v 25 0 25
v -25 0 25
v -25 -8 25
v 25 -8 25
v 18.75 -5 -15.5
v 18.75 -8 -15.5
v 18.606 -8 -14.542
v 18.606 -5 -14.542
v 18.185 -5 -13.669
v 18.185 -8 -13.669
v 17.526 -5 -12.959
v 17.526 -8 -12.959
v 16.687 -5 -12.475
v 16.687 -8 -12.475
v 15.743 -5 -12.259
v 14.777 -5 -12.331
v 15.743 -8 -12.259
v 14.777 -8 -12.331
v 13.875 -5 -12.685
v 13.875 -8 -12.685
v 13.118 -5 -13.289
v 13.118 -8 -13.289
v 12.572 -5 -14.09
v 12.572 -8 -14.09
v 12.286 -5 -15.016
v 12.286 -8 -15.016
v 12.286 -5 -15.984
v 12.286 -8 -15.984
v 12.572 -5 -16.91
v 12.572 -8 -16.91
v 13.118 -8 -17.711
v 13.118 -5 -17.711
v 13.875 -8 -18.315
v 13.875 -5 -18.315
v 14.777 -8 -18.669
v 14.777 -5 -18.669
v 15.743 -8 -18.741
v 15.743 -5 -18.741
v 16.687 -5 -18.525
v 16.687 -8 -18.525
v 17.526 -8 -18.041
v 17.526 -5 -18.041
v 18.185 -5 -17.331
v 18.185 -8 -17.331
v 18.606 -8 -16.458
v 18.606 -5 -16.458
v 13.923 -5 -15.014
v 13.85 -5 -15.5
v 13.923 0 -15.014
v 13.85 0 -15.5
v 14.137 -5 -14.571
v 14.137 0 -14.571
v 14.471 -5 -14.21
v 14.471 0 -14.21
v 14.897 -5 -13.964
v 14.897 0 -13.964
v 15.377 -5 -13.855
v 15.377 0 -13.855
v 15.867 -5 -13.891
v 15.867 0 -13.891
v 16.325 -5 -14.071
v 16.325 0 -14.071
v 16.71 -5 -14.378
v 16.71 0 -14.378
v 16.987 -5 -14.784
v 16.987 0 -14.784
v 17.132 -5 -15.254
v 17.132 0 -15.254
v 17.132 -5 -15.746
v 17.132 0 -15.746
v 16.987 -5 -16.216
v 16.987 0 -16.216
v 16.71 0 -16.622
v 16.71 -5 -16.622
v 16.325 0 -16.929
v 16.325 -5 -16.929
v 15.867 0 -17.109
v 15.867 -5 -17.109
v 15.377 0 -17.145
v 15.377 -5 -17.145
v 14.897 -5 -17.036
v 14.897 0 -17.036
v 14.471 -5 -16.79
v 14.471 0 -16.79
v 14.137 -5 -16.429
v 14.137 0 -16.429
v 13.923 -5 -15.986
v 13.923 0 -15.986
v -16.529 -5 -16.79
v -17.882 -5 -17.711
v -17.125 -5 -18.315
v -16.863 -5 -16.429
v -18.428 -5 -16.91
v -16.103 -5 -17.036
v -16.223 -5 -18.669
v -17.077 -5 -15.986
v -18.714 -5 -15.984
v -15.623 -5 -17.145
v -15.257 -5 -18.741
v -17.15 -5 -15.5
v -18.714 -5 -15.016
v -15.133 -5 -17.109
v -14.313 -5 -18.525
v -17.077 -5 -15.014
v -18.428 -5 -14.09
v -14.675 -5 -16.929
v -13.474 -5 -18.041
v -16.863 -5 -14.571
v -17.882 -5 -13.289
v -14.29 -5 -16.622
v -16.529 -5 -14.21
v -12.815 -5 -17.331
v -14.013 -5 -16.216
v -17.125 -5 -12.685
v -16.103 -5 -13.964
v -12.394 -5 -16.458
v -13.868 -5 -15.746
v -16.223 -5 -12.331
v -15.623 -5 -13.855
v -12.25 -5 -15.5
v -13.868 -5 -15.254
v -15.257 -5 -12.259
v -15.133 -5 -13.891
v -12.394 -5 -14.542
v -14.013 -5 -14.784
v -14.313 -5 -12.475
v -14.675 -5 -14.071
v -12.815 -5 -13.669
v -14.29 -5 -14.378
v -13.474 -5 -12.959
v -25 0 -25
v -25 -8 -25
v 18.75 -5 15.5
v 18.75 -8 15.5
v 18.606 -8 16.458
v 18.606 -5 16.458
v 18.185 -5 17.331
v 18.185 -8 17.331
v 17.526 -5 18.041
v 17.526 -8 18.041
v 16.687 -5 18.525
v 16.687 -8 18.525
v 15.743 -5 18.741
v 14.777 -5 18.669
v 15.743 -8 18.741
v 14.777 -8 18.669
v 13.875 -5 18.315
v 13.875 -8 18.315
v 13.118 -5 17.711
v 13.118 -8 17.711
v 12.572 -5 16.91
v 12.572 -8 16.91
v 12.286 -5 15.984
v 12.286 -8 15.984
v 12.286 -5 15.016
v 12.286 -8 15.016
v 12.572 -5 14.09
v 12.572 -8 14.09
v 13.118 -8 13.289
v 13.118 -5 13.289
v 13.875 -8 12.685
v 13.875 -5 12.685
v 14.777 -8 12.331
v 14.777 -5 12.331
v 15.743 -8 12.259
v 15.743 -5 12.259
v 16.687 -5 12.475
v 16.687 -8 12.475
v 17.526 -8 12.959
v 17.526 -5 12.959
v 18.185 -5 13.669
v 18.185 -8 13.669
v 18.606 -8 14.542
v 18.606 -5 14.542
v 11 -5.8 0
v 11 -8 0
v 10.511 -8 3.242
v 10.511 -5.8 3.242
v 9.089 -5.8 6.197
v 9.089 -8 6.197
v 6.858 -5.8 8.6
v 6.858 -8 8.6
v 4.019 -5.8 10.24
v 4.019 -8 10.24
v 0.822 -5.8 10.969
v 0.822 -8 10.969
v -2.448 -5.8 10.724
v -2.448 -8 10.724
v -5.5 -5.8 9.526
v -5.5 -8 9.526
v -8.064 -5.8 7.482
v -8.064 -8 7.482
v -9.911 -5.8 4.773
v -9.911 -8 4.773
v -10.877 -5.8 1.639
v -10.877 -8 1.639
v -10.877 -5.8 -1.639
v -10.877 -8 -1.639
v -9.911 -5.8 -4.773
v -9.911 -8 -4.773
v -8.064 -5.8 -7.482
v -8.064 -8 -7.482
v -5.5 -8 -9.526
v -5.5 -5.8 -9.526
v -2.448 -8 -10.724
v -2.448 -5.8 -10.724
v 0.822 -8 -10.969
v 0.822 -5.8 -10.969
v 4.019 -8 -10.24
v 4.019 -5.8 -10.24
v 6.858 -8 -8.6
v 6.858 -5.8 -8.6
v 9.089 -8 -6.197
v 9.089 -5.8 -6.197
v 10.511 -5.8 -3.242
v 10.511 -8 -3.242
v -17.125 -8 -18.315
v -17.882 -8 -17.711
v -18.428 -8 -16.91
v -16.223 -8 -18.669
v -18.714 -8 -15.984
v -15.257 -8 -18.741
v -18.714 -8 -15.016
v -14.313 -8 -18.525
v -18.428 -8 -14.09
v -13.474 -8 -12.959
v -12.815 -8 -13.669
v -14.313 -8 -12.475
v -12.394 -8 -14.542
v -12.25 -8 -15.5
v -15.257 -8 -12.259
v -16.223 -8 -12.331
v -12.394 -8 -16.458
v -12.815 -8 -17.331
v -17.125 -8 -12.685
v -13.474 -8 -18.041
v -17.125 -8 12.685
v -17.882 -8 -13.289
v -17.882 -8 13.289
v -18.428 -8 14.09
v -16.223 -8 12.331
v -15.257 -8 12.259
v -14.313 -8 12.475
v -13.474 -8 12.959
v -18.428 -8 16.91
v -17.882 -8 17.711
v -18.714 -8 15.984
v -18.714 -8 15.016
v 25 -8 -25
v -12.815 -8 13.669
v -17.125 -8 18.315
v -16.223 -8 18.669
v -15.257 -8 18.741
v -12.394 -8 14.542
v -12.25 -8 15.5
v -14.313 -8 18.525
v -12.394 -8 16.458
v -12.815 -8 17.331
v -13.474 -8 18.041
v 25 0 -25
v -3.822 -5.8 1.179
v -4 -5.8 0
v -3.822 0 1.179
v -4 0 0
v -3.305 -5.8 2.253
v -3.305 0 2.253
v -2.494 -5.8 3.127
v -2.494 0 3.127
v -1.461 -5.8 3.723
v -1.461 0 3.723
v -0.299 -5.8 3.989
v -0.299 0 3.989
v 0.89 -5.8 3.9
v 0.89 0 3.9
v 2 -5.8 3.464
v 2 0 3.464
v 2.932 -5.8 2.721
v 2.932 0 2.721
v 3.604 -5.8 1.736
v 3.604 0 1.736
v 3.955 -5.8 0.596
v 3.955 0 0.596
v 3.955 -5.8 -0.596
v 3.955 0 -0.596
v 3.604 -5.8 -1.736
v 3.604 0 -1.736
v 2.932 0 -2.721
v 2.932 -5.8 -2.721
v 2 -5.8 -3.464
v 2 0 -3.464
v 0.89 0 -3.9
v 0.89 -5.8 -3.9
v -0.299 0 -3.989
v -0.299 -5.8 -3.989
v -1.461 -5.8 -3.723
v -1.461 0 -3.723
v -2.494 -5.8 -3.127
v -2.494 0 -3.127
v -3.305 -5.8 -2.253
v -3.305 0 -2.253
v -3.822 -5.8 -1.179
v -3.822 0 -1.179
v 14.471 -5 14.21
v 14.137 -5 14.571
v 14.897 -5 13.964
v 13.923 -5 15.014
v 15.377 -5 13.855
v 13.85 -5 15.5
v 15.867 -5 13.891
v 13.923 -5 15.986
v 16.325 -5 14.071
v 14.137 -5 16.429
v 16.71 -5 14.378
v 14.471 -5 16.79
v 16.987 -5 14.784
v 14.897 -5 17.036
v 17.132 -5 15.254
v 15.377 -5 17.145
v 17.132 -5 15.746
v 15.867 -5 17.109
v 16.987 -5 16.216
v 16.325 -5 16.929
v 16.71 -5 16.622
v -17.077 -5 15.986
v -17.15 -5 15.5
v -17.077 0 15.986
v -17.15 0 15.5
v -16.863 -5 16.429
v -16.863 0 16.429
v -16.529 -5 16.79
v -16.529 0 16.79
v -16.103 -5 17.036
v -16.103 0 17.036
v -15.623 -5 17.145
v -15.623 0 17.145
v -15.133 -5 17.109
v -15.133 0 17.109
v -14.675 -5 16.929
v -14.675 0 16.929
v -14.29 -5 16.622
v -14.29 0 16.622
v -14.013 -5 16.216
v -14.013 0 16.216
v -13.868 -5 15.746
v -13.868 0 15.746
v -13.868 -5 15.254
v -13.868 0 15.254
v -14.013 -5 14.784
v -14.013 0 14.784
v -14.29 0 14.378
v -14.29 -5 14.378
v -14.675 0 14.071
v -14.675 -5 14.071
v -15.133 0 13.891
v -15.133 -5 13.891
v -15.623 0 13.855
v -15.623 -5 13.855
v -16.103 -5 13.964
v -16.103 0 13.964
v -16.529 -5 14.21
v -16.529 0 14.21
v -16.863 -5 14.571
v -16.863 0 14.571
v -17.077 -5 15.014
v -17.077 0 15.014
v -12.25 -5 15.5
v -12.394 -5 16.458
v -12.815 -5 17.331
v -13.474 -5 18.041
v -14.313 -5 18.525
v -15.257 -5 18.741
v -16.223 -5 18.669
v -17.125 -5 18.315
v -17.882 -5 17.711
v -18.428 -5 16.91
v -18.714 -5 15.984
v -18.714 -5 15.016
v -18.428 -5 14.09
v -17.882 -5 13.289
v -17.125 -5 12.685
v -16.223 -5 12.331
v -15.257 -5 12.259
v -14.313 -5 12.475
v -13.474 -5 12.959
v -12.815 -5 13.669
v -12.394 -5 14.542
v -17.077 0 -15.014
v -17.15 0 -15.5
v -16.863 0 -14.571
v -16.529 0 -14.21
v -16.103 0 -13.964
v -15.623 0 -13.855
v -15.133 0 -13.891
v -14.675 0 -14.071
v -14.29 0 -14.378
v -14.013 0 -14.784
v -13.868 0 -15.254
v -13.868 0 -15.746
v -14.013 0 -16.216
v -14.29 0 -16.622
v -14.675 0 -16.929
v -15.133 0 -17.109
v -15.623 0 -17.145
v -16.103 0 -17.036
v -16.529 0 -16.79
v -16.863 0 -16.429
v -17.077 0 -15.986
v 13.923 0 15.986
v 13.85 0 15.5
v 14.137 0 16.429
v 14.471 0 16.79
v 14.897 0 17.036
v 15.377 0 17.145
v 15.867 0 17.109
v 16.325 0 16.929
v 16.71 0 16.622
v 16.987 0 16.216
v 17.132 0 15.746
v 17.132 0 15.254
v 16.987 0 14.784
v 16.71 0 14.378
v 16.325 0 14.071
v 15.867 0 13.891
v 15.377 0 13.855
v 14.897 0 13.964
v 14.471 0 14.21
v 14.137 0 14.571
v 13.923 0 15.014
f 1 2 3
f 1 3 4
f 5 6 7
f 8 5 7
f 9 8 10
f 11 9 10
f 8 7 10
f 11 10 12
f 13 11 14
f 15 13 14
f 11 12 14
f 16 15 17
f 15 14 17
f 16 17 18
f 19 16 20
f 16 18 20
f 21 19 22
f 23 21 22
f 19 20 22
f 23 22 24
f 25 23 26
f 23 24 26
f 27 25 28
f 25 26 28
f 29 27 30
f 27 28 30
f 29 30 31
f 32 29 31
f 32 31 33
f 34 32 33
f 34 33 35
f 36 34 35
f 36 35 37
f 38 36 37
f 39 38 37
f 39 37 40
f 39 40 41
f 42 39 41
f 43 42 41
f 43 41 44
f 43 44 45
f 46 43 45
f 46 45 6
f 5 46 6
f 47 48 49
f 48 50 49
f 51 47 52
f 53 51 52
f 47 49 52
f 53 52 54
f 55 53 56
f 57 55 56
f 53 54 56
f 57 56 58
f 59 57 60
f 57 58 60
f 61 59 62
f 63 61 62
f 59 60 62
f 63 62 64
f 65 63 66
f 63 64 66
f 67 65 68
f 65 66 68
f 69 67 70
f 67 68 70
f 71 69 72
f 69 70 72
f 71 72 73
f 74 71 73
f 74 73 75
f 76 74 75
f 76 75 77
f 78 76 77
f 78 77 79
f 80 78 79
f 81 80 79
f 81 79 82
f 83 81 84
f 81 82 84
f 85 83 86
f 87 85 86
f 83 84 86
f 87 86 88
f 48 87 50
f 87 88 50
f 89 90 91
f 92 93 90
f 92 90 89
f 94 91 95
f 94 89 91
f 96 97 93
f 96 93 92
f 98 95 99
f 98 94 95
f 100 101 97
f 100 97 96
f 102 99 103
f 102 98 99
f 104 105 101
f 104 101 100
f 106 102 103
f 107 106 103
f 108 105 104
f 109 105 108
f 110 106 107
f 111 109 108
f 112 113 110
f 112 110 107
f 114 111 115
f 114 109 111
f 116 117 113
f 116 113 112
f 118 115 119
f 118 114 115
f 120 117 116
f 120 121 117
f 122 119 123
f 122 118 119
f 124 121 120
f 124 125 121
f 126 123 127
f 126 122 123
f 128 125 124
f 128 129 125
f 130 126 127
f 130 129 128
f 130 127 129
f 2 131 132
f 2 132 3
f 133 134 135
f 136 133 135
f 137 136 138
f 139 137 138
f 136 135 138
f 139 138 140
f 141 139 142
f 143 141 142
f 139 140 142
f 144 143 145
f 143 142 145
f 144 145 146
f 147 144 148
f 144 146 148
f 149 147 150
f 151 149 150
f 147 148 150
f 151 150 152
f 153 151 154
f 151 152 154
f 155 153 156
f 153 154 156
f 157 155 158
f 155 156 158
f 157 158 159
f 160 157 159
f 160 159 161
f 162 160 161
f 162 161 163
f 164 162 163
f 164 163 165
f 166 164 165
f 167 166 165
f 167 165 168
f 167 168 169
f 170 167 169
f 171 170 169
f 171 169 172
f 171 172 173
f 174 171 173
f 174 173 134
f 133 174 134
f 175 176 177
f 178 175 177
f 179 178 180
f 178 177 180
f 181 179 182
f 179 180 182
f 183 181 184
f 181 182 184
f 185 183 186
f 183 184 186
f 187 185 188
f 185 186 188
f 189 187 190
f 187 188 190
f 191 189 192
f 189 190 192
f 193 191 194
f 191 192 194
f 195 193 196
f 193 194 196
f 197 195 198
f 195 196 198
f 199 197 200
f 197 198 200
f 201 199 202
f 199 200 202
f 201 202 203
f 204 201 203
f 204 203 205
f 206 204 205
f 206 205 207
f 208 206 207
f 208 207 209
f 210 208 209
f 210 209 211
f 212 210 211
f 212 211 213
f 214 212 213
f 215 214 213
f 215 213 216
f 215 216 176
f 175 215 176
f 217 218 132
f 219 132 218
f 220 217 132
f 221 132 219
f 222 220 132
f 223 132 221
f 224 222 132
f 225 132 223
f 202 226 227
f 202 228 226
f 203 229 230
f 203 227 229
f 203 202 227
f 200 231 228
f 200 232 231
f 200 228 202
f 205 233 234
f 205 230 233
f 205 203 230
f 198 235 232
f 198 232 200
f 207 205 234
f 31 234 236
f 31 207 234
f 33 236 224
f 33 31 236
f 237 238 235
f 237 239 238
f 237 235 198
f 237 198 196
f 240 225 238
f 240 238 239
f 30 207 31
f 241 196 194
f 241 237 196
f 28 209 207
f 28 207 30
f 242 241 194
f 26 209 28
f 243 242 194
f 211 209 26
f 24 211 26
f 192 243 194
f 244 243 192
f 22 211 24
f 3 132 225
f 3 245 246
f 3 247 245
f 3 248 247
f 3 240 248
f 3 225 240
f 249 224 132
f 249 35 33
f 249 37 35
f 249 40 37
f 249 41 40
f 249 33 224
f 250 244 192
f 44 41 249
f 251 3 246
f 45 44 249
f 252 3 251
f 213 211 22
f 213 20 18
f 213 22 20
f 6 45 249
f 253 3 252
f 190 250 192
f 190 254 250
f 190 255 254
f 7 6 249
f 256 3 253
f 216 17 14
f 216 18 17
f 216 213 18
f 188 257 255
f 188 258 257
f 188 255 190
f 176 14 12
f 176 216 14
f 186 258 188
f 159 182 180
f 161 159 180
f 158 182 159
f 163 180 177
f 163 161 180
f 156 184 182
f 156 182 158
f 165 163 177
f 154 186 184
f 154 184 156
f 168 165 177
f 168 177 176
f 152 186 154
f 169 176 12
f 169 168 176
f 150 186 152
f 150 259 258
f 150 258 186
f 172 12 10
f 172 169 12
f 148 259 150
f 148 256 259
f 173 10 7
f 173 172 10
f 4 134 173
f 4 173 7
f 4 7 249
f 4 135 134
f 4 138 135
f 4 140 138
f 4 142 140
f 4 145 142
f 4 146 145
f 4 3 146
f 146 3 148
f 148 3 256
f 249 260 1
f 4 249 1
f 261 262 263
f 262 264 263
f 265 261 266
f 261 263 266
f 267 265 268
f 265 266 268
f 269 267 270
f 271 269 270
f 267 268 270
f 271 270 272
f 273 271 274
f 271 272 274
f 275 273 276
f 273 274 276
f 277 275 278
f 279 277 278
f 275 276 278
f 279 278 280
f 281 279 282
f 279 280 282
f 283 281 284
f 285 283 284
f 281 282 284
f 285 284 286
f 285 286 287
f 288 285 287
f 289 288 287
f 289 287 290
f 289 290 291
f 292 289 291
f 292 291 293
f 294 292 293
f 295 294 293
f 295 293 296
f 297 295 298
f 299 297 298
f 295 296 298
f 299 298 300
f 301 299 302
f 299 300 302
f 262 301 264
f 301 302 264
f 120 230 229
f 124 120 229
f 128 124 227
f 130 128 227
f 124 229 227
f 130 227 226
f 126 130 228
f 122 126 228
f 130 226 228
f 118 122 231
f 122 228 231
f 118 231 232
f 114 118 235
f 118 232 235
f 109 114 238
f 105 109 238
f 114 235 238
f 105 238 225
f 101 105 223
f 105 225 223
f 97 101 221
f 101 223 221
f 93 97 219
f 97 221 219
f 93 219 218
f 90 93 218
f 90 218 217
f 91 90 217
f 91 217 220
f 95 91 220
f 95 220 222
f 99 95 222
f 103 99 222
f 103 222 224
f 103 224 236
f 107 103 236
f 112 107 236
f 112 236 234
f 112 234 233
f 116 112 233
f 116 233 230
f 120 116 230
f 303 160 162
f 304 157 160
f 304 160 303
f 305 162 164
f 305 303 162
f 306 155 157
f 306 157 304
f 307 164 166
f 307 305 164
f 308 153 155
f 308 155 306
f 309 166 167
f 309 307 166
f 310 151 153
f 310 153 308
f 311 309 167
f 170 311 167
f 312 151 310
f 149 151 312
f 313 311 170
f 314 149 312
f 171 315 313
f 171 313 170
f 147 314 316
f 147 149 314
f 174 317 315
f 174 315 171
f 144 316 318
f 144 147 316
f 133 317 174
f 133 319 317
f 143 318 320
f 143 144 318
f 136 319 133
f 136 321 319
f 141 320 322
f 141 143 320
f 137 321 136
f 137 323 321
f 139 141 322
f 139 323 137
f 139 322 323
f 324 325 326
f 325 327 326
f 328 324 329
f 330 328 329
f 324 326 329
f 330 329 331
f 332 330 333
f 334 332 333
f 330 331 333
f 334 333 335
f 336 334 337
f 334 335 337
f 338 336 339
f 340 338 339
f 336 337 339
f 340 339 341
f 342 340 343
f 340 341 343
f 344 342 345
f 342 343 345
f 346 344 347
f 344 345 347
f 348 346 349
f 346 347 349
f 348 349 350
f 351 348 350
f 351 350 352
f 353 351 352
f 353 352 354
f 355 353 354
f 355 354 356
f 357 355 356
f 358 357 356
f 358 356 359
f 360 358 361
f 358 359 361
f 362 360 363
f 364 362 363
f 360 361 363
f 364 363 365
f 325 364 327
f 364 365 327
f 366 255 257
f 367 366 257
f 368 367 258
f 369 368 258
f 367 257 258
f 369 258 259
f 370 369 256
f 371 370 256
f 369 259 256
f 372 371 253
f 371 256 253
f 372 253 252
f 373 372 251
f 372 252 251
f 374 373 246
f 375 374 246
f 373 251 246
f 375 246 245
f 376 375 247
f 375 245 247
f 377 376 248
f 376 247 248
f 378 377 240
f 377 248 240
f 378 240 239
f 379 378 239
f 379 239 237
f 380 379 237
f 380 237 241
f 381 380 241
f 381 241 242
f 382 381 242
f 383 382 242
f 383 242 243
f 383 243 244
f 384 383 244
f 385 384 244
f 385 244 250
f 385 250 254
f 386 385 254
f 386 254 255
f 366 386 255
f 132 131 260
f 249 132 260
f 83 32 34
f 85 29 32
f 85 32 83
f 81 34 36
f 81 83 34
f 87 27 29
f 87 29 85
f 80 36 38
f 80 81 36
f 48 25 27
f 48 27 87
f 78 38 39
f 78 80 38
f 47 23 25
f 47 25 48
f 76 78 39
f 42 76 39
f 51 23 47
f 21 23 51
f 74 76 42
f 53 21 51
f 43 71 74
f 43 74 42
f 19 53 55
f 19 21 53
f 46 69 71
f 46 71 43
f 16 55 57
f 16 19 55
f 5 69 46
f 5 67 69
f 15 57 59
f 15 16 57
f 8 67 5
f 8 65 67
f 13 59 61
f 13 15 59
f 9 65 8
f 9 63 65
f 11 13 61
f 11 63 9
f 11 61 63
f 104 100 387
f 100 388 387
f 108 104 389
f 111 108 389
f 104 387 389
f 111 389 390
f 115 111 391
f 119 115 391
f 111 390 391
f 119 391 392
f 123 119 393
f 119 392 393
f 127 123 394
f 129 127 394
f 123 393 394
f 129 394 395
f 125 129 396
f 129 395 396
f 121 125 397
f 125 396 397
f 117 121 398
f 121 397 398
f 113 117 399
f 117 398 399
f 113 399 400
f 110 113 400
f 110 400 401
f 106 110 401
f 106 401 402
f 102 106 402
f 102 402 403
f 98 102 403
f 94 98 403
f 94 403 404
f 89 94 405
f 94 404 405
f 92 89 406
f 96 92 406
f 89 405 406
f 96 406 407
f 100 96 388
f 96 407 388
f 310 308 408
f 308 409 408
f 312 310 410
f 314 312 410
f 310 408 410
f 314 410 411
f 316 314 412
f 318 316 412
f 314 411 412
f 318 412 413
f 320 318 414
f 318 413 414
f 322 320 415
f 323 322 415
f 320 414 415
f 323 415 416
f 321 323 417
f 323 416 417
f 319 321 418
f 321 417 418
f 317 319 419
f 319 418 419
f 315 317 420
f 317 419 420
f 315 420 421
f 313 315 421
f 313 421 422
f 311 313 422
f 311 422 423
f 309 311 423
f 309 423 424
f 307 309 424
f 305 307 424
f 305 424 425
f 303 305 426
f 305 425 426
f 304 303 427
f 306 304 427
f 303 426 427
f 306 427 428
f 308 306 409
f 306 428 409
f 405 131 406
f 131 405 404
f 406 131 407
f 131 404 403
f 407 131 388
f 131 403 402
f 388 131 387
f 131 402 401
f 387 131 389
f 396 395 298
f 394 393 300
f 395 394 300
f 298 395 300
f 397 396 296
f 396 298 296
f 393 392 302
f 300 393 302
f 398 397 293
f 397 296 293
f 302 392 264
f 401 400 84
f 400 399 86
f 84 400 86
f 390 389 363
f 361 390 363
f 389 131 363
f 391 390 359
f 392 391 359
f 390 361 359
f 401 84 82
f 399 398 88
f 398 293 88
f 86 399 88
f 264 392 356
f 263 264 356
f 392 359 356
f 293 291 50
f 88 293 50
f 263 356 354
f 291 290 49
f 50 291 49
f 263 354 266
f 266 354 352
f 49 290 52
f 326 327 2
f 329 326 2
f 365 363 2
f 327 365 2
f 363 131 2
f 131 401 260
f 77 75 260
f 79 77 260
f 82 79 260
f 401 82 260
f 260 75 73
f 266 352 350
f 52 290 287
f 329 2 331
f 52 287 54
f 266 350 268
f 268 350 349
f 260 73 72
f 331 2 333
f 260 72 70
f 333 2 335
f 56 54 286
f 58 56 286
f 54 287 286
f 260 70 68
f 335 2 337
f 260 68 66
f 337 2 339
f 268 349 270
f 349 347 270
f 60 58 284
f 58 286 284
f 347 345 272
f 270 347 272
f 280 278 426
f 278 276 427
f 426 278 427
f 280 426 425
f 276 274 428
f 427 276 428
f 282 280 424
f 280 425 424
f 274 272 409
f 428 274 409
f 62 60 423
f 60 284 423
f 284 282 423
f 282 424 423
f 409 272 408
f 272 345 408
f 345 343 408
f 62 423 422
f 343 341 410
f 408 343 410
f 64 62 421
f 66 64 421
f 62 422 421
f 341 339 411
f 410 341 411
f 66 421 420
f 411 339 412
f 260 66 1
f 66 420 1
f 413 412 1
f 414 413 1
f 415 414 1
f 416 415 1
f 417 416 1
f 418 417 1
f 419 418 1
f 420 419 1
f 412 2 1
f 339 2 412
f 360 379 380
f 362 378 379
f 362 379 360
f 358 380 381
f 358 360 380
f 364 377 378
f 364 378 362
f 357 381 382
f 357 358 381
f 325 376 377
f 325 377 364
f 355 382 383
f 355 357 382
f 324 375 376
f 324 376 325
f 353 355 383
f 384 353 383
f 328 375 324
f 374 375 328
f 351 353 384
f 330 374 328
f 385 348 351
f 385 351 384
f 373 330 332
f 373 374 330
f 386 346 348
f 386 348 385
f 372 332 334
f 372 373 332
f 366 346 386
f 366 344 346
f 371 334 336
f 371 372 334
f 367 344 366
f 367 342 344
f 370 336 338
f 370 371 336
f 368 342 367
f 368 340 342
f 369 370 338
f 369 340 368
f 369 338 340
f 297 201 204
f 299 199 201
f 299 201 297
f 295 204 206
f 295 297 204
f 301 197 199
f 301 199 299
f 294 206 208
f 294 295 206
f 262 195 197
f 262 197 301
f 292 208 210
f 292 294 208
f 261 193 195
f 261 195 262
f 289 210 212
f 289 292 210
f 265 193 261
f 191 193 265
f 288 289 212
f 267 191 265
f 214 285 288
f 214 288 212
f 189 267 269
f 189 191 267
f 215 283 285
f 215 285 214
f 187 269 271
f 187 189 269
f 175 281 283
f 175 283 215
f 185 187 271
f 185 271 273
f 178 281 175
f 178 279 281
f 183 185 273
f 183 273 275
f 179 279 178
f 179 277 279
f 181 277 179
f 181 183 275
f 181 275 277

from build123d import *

# Parameters (mm, degrees)
F0_W           = 50
F0_H           = 50
F1_DEPTH       = 8
F3_D           = 8
F3_CBORE_D     = 22
F3_CBORE_DEPTH = 2.2
F5_D           = 3.3
F5_CBORE_D     = 6.5
F5_CBORE_DEPTH = 3


with BuildPart() as f1:
    # F0 (on Front) → F1 (new body)
    with BuildSketch(Plane.XZ):
        Rectangle(F0_W, F0_H)
    extrude(amount=F1_DEPTH)

    # F3 (through all)
    with Locations(Plane.XZ.offset(8)):
        with Locations((0, 0)):
            CounterBoreHole(F3_D / 2, F3_CBORE_D / 2, F3_CBORE_DEPTH)

    # F5 (through all)
    with Locations(Plane.XZ.offset(8)):
        with Locations((15.5, 15.5), (-15.5, 15.5), (-15.5, -15.5), (15.5, -15.5)):
            CounterBoreHole(F5_D / 2, F5_CBORE_D / 2, F5_CBORE_DEPTH)


solid = f1.part
